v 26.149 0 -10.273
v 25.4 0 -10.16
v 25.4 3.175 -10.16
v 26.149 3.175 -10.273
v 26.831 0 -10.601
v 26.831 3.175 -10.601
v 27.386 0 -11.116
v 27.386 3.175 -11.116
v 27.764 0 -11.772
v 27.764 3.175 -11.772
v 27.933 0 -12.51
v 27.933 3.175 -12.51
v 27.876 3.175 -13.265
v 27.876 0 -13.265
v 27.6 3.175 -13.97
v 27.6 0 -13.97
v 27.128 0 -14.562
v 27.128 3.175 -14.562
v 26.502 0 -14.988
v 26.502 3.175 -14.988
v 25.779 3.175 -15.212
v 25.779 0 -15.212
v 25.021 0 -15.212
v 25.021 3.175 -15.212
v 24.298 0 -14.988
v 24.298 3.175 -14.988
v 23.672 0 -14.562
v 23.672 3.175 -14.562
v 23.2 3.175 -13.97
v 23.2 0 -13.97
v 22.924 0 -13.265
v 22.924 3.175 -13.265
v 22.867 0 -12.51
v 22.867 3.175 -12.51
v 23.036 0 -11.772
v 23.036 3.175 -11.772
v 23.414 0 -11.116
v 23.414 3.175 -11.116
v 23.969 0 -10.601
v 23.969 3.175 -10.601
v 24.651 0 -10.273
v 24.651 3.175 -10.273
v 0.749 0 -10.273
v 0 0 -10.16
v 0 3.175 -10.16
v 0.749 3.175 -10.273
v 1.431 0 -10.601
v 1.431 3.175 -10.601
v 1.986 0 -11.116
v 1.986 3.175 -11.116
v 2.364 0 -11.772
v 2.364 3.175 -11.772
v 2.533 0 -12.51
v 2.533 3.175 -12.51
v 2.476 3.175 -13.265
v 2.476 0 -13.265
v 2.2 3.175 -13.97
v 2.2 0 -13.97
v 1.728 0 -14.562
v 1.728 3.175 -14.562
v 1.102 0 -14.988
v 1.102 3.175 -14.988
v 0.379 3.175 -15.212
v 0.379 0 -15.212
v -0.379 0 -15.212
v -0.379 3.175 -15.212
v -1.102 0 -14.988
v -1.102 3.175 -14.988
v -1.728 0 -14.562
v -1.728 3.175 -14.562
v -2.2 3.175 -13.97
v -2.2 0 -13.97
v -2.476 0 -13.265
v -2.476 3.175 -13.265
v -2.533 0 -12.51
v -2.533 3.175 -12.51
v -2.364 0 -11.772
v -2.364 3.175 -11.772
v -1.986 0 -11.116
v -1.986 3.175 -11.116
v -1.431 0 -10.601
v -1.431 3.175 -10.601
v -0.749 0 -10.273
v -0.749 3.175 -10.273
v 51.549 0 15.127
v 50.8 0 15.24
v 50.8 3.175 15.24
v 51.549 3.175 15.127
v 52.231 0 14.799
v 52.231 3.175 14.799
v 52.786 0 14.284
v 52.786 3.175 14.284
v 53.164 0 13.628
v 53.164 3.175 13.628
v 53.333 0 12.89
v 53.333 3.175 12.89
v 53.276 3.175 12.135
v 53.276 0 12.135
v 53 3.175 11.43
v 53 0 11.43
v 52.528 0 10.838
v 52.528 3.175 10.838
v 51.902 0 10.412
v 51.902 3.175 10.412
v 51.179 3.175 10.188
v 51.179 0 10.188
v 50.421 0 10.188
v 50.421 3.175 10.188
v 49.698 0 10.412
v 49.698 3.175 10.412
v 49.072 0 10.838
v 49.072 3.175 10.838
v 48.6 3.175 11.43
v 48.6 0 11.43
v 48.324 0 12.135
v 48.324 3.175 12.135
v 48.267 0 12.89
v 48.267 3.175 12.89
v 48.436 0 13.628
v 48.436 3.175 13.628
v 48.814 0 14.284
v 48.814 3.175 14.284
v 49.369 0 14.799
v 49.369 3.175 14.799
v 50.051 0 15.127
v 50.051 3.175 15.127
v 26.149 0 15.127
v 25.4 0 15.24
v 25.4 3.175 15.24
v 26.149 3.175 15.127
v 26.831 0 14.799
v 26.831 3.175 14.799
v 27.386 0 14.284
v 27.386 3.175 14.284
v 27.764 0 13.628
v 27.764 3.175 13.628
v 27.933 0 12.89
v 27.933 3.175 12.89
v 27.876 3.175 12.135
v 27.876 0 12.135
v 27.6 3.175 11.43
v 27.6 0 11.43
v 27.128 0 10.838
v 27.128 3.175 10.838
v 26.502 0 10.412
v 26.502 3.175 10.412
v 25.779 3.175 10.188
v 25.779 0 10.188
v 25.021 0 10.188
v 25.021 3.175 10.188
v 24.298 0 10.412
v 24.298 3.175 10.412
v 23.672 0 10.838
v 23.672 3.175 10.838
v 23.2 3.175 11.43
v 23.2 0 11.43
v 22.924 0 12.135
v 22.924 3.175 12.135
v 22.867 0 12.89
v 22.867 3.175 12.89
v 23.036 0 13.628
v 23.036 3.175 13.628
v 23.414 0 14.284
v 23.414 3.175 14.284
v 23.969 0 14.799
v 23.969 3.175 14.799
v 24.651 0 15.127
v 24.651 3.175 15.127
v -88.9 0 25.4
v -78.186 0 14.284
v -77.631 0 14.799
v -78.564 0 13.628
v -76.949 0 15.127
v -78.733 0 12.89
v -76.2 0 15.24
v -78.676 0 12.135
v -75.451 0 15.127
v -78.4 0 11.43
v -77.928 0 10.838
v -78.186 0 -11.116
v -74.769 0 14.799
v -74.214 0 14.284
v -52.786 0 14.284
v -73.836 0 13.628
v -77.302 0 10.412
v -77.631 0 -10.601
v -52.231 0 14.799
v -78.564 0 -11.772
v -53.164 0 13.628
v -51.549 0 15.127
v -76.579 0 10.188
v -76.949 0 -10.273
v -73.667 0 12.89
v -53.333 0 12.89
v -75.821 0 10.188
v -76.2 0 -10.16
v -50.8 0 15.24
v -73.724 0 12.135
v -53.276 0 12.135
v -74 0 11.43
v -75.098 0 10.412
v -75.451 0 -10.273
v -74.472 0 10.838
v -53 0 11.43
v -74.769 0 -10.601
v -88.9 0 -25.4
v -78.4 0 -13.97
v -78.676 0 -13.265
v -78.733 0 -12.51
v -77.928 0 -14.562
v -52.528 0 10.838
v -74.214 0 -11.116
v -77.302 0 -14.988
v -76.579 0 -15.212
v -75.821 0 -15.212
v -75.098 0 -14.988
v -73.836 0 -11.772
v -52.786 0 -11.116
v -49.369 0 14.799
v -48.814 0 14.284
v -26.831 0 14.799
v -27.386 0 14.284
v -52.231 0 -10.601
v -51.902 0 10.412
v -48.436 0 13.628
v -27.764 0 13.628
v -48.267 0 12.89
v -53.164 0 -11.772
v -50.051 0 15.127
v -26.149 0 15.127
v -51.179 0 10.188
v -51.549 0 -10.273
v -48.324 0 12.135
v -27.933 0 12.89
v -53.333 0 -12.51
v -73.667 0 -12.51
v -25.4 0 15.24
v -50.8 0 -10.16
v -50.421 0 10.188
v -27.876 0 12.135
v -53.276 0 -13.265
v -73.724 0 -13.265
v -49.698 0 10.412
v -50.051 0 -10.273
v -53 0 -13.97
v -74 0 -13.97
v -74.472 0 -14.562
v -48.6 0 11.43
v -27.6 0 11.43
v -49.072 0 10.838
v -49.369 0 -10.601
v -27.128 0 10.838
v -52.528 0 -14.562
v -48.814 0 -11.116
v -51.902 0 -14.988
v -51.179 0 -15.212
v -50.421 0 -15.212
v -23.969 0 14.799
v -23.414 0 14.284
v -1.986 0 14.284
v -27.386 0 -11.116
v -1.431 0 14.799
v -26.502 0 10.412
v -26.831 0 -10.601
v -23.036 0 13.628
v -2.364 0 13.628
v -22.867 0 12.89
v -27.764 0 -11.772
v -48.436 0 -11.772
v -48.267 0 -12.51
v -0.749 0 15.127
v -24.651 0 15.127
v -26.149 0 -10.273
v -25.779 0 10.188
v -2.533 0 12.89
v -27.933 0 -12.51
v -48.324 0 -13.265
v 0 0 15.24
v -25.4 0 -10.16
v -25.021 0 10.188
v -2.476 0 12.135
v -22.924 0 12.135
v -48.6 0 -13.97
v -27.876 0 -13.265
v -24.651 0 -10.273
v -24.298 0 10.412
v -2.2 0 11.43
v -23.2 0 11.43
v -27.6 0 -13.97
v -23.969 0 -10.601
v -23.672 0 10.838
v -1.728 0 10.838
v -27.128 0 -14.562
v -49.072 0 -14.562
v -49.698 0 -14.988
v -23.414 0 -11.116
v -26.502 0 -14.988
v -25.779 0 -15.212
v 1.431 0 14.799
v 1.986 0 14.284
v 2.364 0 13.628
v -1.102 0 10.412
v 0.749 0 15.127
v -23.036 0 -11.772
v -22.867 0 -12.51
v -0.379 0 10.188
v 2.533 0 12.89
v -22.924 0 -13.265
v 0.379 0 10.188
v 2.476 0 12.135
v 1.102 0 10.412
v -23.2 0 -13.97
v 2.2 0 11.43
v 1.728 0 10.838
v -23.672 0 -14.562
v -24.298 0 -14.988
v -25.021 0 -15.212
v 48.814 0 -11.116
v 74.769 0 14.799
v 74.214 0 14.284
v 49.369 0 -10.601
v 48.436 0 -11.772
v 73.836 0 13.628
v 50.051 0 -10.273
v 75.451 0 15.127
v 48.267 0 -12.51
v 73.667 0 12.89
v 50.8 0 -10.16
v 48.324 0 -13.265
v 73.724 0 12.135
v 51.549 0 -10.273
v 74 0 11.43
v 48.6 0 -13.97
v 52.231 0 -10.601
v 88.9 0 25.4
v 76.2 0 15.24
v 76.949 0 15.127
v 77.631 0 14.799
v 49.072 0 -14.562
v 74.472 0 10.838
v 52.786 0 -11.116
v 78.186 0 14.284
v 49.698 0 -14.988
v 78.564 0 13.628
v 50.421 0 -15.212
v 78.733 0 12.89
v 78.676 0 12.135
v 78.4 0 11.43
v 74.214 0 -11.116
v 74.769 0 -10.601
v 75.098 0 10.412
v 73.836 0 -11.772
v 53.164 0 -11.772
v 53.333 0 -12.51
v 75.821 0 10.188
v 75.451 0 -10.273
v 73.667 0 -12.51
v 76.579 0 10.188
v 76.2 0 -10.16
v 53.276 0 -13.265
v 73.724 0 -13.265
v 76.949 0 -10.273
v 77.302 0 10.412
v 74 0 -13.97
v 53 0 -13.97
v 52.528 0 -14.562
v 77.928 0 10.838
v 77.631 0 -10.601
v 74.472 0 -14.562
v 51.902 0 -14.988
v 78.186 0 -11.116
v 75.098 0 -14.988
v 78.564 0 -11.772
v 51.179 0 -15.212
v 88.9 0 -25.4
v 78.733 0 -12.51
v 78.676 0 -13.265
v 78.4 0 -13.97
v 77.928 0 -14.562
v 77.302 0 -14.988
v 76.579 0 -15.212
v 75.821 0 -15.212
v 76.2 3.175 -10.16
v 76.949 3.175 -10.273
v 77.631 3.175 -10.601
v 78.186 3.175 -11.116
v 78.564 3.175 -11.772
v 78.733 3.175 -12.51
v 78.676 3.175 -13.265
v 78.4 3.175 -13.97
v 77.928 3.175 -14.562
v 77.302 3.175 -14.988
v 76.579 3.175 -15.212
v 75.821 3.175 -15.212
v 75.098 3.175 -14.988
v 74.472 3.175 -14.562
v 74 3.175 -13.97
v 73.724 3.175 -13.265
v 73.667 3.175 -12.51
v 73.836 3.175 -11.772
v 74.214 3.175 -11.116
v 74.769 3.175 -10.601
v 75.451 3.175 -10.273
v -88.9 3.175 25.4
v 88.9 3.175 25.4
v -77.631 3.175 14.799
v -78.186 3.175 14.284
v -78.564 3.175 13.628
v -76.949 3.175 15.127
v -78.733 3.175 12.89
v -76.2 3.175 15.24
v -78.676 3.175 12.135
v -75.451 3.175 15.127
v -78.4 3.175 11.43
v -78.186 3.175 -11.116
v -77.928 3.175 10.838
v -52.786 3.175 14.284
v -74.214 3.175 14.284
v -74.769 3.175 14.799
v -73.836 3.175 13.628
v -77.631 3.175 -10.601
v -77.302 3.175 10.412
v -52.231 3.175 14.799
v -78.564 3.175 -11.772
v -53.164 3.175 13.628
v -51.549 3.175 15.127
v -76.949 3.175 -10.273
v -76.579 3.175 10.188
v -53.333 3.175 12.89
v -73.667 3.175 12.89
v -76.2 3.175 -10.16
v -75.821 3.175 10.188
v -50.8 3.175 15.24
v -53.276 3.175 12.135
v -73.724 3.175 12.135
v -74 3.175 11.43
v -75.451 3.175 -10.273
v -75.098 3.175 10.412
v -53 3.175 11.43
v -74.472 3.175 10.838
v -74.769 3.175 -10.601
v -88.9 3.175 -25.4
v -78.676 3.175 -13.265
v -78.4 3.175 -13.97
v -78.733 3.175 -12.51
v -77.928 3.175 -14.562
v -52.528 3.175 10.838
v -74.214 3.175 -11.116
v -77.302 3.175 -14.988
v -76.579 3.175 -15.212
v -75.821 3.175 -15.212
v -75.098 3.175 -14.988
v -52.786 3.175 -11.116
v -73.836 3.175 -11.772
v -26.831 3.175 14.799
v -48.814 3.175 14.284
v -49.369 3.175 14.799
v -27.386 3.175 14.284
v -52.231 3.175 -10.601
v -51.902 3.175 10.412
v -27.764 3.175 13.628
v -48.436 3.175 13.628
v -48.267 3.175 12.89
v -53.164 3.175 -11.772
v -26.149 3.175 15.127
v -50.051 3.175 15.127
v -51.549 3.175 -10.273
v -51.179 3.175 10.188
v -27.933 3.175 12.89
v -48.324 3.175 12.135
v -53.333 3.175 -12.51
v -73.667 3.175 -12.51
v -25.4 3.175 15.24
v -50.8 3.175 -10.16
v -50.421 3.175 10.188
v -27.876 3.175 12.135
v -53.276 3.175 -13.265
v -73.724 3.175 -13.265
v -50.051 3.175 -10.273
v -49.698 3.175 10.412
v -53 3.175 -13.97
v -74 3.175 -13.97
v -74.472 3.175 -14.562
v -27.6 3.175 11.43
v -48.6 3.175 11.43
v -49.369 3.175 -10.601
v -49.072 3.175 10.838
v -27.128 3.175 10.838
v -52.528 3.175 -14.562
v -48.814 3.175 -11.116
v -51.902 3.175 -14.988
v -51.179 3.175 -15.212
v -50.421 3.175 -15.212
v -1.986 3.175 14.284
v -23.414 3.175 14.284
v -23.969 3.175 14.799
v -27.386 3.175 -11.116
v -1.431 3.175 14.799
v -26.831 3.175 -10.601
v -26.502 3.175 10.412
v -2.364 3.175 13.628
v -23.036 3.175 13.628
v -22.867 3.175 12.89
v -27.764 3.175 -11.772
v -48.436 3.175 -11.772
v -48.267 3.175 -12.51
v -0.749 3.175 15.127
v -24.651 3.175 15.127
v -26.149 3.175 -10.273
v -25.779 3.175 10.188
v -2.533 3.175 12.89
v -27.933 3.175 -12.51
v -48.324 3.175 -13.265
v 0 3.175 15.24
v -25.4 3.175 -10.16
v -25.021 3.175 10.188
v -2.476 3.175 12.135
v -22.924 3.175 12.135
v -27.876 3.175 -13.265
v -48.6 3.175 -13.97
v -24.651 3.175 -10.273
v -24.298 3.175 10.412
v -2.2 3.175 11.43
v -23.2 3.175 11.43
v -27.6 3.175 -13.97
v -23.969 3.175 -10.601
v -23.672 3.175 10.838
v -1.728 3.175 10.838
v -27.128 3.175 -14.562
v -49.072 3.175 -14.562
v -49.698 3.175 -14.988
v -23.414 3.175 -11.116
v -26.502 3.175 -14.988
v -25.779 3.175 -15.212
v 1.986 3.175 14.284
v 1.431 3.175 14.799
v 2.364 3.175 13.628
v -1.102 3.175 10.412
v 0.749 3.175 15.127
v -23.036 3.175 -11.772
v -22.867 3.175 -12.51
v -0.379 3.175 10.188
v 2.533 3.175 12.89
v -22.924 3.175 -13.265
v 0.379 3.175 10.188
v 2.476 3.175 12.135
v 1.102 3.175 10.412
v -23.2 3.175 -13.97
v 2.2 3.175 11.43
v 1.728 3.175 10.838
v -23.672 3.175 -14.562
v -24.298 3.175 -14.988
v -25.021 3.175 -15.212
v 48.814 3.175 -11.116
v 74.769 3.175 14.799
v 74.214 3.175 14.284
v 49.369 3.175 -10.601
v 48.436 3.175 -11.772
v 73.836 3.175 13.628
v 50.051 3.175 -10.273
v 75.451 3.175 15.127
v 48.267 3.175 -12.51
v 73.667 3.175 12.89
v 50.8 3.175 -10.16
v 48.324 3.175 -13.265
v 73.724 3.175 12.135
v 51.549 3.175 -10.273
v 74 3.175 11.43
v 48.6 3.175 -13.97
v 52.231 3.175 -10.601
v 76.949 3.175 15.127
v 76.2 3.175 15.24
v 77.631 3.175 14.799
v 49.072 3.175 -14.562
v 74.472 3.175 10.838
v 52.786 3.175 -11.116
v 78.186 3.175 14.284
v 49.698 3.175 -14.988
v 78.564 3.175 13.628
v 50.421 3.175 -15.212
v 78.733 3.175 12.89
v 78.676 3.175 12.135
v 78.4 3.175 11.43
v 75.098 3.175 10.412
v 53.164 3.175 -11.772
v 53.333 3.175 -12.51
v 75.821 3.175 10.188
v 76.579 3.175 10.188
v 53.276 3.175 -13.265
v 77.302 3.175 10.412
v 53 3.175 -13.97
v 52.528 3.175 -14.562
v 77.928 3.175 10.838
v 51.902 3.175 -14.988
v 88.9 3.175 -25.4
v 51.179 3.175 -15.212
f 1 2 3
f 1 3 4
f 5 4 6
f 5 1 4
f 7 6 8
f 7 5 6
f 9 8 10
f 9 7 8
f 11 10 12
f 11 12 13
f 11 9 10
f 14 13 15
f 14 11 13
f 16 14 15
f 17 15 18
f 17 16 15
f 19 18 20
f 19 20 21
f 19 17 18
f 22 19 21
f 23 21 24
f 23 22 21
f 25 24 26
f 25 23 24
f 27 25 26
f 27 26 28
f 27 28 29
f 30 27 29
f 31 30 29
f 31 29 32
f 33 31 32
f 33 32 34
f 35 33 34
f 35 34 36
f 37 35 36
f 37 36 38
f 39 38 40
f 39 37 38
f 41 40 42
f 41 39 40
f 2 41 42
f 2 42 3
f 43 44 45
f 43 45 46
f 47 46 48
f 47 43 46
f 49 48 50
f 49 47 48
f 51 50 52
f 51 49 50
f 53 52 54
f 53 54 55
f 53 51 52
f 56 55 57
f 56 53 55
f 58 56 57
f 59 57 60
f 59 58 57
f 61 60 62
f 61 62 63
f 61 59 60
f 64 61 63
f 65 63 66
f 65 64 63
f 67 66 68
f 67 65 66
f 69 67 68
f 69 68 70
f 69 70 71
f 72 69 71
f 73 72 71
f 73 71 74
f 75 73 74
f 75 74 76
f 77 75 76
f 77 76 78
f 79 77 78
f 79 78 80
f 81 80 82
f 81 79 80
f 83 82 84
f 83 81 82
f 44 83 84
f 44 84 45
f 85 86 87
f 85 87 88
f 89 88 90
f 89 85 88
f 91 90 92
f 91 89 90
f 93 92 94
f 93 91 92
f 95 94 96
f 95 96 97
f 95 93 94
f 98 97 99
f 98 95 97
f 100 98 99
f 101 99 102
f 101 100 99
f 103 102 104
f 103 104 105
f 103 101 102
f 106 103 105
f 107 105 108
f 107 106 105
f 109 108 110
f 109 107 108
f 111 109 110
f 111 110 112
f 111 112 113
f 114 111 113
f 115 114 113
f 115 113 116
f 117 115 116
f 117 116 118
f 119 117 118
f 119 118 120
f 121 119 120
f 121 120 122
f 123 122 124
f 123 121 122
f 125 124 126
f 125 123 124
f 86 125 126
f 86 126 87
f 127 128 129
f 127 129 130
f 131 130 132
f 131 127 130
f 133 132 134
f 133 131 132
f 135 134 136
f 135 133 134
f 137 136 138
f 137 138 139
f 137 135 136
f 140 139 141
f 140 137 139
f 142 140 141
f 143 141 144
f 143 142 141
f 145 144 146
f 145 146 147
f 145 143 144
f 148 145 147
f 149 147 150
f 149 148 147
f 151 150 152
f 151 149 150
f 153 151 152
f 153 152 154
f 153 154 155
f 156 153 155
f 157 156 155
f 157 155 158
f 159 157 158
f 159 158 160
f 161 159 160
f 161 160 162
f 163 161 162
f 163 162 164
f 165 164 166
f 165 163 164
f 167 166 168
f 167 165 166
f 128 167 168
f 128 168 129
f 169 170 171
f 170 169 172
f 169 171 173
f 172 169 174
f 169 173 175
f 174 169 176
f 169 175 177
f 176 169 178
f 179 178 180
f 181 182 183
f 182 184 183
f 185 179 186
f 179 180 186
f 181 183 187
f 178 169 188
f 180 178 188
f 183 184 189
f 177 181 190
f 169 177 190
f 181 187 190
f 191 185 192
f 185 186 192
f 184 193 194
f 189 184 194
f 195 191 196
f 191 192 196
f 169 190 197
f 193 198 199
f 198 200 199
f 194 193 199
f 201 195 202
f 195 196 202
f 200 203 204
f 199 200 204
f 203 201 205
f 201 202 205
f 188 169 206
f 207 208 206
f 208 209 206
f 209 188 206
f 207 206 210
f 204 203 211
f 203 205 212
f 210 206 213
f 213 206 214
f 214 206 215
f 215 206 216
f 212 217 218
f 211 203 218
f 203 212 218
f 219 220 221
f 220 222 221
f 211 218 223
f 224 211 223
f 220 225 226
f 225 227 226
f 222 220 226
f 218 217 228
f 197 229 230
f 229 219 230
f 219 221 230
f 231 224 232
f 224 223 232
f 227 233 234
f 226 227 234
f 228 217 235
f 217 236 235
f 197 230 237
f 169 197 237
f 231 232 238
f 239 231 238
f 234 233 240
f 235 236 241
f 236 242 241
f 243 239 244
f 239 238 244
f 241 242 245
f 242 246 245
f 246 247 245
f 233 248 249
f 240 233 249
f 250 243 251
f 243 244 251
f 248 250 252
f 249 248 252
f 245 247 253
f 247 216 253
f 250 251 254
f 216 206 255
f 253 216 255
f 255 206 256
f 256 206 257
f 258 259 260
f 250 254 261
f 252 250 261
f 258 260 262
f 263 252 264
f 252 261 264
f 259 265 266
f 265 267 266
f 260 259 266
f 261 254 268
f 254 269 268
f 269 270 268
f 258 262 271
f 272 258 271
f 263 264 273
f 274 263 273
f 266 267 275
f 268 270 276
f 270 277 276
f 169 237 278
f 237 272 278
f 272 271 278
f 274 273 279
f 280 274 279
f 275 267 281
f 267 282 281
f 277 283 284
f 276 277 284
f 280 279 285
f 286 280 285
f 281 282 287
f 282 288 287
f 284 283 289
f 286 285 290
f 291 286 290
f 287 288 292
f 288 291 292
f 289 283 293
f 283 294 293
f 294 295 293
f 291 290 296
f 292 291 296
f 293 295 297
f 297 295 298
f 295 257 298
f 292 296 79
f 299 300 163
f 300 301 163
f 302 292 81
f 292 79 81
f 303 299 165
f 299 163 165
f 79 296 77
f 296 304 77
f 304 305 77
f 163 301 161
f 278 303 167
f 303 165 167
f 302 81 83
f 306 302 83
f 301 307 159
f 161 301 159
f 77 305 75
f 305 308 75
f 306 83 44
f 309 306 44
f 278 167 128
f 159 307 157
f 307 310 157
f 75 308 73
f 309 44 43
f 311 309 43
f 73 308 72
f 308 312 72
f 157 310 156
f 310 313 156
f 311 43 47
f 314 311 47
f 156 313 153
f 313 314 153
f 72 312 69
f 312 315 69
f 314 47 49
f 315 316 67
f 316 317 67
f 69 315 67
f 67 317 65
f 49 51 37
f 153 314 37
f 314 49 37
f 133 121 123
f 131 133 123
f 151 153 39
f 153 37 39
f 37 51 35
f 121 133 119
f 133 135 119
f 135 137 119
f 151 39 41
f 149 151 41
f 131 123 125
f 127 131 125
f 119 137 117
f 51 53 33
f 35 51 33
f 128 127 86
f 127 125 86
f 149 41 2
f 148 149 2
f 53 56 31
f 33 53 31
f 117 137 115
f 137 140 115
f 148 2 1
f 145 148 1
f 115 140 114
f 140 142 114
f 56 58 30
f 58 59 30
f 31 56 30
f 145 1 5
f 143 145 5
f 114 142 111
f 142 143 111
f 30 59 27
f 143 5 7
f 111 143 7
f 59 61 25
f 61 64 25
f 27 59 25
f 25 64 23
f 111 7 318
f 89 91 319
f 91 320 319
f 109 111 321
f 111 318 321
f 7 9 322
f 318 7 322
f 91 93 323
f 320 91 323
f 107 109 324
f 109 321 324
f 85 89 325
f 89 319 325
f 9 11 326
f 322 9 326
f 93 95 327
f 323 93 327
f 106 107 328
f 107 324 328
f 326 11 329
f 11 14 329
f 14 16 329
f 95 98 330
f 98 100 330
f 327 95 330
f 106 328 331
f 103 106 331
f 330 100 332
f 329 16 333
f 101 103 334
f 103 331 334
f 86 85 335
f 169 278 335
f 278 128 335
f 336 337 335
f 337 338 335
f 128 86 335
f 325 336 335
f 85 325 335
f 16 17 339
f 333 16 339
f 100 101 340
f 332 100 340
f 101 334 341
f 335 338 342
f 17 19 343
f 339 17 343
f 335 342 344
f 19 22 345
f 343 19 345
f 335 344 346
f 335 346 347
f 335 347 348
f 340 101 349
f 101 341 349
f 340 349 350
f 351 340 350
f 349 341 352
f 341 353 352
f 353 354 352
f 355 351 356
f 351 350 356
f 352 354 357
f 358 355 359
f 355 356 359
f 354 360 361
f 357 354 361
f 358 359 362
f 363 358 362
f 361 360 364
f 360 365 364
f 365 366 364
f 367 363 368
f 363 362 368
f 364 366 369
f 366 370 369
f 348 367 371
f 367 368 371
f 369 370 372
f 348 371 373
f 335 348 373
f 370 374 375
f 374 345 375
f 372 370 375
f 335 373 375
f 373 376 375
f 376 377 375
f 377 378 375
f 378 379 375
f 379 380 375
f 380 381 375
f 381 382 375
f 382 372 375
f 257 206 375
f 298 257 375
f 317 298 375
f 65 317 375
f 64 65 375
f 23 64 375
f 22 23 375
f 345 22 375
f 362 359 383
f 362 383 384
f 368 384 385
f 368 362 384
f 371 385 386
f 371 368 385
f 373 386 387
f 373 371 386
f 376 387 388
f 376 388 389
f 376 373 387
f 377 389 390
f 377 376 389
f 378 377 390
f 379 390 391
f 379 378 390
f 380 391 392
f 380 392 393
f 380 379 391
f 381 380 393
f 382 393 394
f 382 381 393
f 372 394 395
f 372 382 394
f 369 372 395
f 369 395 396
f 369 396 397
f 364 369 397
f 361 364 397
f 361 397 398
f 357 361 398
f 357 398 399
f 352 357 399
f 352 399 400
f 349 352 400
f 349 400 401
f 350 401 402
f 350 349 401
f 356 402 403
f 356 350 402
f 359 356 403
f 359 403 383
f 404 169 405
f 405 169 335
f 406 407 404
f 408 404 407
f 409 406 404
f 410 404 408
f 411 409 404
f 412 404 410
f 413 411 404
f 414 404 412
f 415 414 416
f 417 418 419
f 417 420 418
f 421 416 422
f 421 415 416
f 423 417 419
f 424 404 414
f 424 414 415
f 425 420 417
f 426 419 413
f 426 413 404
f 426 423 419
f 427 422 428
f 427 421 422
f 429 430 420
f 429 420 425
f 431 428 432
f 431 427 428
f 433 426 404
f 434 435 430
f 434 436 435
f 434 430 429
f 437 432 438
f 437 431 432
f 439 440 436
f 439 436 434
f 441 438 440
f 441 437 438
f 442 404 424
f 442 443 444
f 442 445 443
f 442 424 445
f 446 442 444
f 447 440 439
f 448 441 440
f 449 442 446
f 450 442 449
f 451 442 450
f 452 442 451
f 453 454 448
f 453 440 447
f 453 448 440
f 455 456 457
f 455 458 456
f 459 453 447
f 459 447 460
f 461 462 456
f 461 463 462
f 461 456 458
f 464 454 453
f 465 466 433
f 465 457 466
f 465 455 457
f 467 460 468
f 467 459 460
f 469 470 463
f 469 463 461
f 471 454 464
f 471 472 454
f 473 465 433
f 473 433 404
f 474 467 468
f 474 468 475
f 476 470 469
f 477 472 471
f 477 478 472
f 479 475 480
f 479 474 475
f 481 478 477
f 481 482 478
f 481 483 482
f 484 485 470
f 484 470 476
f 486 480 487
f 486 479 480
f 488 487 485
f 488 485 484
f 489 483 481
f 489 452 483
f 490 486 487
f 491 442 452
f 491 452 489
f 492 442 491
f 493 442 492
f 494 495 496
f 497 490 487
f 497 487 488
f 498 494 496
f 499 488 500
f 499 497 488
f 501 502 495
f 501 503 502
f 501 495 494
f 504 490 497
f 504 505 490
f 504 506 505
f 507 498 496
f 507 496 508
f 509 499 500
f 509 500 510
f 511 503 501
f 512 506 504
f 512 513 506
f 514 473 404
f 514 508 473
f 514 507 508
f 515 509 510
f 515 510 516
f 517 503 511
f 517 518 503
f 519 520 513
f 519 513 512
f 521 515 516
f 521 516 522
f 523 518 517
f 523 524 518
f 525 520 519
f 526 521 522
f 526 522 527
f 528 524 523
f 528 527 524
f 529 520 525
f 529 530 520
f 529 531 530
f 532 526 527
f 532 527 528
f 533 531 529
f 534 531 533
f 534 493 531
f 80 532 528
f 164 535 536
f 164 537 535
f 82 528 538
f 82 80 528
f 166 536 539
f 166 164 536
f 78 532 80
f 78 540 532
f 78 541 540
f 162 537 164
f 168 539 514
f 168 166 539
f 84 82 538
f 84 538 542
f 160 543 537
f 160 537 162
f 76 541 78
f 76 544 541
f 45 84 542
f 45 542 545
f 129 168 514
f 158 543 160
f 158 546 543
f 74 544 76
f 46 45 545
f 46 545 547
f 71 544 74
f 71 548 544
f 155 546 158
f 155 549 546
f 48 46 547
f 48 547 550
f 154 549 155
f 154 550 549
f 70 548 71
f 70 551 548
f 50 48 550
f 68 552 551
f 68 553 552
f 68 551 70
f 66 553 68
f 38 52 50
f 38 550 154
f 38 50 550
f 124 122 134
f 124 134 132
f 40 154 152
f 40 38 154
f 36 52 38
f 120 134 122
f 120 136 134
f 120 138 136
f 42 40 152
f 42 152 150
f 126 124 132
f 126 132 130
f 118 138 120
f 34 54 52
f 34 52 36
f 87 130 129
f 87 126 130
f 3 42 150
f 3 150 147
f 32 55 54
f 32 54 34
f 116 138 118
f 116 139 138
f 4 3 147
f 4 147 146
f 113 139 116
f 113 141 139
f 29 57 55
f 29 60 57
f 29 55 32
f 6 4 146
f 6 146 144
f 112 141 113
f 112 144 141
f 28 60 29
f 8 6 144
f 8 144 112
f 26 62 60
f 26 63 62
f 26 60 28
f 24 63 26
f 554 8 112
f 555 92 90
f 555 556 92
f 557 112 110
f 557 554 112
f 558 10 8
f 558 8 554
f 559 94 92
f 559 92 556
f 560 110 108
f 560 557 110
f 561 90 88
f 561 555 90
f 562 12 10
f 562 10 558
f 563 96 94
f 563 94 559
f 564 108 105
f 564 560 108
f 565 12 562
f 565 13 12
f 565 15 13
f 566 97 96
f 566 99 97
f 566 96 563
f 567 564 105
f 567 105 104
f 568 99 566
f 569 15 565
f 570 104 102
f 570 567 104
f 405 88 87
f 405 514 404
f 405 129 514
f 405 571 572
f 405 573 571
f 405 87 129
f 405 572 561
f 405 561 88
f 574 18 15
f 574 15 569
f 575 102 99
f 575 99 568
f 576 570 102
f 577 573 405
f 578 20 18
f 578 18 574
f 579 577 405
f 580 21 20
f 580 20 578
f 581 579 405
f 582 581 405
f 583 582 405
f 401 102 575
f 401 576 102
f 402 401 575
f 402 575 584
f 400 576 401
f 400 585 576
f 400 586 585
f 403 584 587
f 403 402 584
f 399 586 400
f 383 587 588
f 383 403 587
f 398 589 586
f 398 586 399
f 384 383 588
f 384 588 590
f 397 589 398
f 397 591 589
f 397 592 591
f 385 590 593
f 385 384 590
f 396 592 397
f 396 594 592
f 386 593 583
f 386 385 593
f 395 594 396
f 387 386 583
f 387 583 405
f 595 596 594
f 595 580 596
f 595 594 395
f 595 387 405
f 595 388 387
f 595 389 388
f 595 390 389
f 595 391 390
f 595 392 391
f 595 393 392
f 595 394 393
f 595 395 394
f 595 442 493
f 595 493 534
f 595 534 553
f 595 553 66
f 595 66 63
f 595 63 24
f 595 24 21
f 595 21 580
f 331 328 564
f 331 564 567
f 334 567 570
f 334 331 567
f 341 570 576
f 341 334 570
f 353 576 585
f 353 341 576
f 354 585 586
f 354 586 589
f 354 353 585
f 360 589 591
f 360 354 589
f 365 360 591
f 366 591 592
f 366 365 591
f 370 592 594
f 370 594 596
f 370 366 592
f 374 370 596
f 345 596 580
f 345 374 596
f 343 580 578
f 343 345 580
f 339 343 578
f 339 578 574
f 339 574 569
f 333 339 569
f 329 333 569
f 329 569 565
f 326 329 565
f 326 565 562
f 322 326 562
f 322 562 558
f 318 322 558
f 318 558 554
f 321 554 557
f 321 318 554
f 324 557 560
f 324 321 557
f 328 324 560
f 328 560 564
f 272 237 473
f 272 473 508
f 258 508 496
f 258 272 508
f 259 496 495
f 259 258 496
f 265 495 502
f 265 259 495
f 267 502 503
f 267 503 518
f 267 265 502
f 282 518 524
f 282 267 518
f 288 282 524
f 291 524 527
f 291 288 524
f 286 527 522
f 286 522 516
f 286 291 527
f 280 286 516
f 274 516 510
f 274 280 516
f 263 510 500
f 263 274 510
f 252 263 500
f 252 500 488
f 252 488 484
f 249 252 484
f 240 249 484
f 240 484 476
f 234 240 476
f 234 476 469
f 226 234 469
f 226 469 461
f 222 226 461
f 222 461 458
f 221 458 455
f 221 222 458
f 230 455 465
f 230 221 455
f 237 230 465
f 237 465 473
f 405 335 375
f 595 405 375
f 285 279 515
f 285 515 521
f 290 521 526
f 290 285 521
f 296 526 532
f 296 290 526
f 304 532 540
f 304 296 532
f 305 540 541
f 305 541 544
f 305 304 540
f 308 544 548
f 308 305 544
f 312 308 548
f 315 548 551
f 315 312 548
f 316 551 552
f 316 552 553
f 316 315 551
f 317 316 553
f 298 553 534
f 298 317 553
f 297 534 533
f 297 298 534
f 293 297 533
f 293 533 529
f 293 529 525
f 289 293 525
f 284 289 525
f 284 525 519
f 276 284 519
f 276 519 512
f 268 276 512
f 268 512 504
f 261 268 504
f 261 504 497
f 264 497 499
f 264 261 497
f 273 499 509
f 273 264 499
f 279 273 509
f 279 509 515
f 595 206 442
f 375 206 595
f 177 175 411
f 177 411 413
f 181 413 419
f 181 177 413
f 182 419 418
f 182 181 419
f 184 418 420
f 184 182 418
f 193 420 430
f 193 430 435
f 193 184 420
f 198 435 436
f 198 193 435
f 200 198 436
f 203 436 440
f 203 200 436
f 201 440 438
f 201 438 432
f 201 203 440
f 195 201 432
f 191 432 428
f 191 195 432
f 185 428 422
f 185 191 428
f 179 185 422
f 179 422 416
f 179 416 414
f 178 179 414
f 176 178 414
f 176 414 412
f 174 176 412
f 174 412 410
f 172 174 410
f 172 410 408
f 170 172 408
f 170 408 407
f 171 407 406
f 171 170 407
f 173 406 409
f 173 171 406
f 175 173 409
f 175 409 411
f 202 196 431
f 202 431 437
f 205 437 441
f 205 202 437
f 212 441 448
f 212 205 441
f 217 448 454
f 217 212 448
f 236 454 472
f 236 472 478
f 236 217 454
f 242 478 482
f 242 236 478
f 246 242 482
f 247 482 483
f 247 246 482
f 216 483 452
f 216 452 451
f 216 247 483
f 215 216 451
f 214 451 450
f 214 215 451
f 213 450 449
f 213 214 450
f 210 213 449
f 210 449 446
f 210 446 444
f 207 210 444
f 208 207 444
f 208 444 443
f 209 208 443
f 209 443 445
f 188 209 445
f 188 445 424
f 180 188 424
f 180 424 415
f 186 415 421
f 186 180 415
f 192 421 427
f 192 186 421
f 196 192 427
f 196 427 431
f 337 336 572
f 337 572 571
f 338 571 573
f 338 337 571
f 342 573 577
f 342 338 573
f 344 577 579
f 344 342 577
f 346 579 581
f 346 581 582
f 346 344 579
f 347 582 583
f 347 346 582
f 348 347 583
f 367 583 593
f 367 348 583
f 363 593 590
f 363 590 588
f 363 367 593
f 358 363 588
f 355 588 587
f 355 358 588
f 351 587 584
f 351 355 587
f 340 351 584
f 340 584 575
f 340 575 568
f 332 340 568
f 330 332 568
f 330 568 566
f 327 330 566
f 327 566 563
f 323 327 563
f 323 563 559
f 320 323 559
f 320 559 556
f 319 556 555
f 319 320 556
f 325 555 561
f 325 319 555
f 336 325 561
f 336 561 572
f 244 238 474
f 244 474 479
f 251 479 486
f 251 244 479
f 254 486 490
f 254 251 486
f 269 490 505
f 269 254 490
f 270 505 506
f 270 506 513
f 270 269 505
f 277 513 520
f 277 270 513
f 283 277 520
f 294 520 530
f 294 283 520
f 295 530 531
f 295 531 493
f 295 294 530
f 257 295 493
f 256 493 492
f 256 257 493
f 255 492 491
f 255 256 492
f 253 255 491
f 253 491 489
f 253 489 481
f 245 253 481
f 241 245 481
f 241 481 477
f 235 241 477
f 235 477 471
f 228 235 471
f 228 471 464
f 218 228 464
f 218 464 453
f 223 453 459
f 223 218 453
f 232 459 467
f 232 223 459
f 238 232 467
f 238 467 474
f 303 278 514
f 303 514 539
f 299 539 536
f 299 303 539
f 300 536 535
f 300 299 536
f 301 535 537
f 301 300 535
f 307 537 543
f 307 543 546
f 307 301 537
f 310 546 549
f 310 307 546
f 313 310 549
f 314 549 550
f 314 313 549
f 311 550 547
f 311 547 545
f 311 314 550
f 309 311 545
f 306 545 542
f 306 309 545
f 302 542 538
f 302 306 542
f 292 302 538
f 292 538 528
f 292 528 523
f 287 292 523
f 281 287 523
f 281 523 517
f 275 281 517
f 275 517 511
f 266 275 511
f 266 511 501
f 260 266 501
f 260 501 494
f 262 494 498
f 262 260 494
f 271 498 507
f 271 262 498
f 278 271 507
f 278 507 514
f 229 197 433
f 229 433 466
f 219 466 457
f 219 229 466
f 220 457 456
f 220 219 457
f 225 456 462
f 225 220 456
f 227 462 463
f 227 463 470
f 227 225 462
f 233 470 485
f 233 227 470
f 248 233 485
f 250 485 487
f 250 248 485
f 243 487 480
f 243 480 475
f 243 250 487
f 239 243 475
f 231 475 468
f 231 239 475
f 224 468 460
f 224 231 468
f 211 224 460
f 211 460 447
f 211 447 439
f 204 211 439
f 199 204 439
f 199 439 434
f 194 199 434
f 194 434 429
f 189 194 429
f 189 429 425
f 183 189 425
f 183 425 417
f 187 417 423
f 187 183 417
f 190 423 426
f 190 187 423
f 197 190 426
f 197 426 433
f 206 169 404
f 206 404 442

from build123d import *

# Parameters (mm, degrees)
SKETCH2_W           = 177.8
SKETCH2_H           = 50.8
SKETCH2_R           = 2.54
BOSS_EXTRUDE1_DEPTH = 3.175


with BuildPart() as part:
    # Sketch2 → Boss-Extrude1 (new body)
    with BuildSketch(Plane(origin=(0, 0, 0), x_dir=(1, 0, 0), z_dir=(0, 1, 0))):
        Rectangle(SKETCH2_W, SKETCH2_H)
        with Locations(Location((-76.2, -12.7, 0), (0, 0, 270))):
            Circle(SKETCH2_R, mode=Mode.SUBTRACT)
        with Locations(Location((-76.2, 12.7, 0), (0, 0, 270))):
            Circle(SKETCH2_R, mode=Mode.SUBTRACT)
        with Locations(Location((-50.8, -12.7, 0), (0, 0, 270))):
            Circle(SKETCH2_R, mode=Mode.SUBTRACT)
        with Locations(Location((-50.8, 12.7, 0), (0, 0, 270))):
            Circle(SKETCH2_R, mode=Mode.SUBTRACT)
        with Locations(Location((-25.4, -12.7, 0), (0, 0, 270))):
            Circle(SKETCH2_R, mode=Mode.SUBTRACT)
        with Locations(Location((-25.4, 12.7, 0), (0, 0, 270))):
            Circle(SKETCH2_R, mode=Mode.SUBTRACT)
        with Locations(Location((0, -12.7, 0), (0, 0, 270))):
            Circle(SKETCH2_R, mode=Mode.SUBTRACT)
        with Locations(Location((0, 12.7, 0), (0, 0, 270))):
            Circle(SKETCH2_R, mode=Mode.SUBTRACT)
        with Locations(Location((25.4, -12.7, 0), (0, 0, 270))):
            Circle(SKETCH2_R, mode=Mode.SUBTRACT)
        with Locations(Location((25.4, 12.7, 0), (0, 0, 270))):
            Circle(SKETCH2_R, mode=Mode.SUBTRACT)
        with Locations(Location((50.8, -12.7, 0), (0, 0, 270))):
            Circle(SKETCH2_R, mode=Mode.SUBTRACT)
        with Locations(Location((50.8, 12.7, 0), (0, 0, 270))):
            Circle(SKETCH2_R, mode=Mode.SUBTRACT)
        with Locations(Location((76.2, -12.7, 0), (0, 0, 270))):
            Circle(SKETCH2_R, mode=Mode.SUBTRACT)
        with Locations(Location((76.2, 12.7, 0), (0, 0, 270))):
            Circle(SKETCH2_R, mode=Mode.SUBTRACT)
    extrude(amount=BOSS_EXTRUDE1_DEPTH)


solid = part.part
